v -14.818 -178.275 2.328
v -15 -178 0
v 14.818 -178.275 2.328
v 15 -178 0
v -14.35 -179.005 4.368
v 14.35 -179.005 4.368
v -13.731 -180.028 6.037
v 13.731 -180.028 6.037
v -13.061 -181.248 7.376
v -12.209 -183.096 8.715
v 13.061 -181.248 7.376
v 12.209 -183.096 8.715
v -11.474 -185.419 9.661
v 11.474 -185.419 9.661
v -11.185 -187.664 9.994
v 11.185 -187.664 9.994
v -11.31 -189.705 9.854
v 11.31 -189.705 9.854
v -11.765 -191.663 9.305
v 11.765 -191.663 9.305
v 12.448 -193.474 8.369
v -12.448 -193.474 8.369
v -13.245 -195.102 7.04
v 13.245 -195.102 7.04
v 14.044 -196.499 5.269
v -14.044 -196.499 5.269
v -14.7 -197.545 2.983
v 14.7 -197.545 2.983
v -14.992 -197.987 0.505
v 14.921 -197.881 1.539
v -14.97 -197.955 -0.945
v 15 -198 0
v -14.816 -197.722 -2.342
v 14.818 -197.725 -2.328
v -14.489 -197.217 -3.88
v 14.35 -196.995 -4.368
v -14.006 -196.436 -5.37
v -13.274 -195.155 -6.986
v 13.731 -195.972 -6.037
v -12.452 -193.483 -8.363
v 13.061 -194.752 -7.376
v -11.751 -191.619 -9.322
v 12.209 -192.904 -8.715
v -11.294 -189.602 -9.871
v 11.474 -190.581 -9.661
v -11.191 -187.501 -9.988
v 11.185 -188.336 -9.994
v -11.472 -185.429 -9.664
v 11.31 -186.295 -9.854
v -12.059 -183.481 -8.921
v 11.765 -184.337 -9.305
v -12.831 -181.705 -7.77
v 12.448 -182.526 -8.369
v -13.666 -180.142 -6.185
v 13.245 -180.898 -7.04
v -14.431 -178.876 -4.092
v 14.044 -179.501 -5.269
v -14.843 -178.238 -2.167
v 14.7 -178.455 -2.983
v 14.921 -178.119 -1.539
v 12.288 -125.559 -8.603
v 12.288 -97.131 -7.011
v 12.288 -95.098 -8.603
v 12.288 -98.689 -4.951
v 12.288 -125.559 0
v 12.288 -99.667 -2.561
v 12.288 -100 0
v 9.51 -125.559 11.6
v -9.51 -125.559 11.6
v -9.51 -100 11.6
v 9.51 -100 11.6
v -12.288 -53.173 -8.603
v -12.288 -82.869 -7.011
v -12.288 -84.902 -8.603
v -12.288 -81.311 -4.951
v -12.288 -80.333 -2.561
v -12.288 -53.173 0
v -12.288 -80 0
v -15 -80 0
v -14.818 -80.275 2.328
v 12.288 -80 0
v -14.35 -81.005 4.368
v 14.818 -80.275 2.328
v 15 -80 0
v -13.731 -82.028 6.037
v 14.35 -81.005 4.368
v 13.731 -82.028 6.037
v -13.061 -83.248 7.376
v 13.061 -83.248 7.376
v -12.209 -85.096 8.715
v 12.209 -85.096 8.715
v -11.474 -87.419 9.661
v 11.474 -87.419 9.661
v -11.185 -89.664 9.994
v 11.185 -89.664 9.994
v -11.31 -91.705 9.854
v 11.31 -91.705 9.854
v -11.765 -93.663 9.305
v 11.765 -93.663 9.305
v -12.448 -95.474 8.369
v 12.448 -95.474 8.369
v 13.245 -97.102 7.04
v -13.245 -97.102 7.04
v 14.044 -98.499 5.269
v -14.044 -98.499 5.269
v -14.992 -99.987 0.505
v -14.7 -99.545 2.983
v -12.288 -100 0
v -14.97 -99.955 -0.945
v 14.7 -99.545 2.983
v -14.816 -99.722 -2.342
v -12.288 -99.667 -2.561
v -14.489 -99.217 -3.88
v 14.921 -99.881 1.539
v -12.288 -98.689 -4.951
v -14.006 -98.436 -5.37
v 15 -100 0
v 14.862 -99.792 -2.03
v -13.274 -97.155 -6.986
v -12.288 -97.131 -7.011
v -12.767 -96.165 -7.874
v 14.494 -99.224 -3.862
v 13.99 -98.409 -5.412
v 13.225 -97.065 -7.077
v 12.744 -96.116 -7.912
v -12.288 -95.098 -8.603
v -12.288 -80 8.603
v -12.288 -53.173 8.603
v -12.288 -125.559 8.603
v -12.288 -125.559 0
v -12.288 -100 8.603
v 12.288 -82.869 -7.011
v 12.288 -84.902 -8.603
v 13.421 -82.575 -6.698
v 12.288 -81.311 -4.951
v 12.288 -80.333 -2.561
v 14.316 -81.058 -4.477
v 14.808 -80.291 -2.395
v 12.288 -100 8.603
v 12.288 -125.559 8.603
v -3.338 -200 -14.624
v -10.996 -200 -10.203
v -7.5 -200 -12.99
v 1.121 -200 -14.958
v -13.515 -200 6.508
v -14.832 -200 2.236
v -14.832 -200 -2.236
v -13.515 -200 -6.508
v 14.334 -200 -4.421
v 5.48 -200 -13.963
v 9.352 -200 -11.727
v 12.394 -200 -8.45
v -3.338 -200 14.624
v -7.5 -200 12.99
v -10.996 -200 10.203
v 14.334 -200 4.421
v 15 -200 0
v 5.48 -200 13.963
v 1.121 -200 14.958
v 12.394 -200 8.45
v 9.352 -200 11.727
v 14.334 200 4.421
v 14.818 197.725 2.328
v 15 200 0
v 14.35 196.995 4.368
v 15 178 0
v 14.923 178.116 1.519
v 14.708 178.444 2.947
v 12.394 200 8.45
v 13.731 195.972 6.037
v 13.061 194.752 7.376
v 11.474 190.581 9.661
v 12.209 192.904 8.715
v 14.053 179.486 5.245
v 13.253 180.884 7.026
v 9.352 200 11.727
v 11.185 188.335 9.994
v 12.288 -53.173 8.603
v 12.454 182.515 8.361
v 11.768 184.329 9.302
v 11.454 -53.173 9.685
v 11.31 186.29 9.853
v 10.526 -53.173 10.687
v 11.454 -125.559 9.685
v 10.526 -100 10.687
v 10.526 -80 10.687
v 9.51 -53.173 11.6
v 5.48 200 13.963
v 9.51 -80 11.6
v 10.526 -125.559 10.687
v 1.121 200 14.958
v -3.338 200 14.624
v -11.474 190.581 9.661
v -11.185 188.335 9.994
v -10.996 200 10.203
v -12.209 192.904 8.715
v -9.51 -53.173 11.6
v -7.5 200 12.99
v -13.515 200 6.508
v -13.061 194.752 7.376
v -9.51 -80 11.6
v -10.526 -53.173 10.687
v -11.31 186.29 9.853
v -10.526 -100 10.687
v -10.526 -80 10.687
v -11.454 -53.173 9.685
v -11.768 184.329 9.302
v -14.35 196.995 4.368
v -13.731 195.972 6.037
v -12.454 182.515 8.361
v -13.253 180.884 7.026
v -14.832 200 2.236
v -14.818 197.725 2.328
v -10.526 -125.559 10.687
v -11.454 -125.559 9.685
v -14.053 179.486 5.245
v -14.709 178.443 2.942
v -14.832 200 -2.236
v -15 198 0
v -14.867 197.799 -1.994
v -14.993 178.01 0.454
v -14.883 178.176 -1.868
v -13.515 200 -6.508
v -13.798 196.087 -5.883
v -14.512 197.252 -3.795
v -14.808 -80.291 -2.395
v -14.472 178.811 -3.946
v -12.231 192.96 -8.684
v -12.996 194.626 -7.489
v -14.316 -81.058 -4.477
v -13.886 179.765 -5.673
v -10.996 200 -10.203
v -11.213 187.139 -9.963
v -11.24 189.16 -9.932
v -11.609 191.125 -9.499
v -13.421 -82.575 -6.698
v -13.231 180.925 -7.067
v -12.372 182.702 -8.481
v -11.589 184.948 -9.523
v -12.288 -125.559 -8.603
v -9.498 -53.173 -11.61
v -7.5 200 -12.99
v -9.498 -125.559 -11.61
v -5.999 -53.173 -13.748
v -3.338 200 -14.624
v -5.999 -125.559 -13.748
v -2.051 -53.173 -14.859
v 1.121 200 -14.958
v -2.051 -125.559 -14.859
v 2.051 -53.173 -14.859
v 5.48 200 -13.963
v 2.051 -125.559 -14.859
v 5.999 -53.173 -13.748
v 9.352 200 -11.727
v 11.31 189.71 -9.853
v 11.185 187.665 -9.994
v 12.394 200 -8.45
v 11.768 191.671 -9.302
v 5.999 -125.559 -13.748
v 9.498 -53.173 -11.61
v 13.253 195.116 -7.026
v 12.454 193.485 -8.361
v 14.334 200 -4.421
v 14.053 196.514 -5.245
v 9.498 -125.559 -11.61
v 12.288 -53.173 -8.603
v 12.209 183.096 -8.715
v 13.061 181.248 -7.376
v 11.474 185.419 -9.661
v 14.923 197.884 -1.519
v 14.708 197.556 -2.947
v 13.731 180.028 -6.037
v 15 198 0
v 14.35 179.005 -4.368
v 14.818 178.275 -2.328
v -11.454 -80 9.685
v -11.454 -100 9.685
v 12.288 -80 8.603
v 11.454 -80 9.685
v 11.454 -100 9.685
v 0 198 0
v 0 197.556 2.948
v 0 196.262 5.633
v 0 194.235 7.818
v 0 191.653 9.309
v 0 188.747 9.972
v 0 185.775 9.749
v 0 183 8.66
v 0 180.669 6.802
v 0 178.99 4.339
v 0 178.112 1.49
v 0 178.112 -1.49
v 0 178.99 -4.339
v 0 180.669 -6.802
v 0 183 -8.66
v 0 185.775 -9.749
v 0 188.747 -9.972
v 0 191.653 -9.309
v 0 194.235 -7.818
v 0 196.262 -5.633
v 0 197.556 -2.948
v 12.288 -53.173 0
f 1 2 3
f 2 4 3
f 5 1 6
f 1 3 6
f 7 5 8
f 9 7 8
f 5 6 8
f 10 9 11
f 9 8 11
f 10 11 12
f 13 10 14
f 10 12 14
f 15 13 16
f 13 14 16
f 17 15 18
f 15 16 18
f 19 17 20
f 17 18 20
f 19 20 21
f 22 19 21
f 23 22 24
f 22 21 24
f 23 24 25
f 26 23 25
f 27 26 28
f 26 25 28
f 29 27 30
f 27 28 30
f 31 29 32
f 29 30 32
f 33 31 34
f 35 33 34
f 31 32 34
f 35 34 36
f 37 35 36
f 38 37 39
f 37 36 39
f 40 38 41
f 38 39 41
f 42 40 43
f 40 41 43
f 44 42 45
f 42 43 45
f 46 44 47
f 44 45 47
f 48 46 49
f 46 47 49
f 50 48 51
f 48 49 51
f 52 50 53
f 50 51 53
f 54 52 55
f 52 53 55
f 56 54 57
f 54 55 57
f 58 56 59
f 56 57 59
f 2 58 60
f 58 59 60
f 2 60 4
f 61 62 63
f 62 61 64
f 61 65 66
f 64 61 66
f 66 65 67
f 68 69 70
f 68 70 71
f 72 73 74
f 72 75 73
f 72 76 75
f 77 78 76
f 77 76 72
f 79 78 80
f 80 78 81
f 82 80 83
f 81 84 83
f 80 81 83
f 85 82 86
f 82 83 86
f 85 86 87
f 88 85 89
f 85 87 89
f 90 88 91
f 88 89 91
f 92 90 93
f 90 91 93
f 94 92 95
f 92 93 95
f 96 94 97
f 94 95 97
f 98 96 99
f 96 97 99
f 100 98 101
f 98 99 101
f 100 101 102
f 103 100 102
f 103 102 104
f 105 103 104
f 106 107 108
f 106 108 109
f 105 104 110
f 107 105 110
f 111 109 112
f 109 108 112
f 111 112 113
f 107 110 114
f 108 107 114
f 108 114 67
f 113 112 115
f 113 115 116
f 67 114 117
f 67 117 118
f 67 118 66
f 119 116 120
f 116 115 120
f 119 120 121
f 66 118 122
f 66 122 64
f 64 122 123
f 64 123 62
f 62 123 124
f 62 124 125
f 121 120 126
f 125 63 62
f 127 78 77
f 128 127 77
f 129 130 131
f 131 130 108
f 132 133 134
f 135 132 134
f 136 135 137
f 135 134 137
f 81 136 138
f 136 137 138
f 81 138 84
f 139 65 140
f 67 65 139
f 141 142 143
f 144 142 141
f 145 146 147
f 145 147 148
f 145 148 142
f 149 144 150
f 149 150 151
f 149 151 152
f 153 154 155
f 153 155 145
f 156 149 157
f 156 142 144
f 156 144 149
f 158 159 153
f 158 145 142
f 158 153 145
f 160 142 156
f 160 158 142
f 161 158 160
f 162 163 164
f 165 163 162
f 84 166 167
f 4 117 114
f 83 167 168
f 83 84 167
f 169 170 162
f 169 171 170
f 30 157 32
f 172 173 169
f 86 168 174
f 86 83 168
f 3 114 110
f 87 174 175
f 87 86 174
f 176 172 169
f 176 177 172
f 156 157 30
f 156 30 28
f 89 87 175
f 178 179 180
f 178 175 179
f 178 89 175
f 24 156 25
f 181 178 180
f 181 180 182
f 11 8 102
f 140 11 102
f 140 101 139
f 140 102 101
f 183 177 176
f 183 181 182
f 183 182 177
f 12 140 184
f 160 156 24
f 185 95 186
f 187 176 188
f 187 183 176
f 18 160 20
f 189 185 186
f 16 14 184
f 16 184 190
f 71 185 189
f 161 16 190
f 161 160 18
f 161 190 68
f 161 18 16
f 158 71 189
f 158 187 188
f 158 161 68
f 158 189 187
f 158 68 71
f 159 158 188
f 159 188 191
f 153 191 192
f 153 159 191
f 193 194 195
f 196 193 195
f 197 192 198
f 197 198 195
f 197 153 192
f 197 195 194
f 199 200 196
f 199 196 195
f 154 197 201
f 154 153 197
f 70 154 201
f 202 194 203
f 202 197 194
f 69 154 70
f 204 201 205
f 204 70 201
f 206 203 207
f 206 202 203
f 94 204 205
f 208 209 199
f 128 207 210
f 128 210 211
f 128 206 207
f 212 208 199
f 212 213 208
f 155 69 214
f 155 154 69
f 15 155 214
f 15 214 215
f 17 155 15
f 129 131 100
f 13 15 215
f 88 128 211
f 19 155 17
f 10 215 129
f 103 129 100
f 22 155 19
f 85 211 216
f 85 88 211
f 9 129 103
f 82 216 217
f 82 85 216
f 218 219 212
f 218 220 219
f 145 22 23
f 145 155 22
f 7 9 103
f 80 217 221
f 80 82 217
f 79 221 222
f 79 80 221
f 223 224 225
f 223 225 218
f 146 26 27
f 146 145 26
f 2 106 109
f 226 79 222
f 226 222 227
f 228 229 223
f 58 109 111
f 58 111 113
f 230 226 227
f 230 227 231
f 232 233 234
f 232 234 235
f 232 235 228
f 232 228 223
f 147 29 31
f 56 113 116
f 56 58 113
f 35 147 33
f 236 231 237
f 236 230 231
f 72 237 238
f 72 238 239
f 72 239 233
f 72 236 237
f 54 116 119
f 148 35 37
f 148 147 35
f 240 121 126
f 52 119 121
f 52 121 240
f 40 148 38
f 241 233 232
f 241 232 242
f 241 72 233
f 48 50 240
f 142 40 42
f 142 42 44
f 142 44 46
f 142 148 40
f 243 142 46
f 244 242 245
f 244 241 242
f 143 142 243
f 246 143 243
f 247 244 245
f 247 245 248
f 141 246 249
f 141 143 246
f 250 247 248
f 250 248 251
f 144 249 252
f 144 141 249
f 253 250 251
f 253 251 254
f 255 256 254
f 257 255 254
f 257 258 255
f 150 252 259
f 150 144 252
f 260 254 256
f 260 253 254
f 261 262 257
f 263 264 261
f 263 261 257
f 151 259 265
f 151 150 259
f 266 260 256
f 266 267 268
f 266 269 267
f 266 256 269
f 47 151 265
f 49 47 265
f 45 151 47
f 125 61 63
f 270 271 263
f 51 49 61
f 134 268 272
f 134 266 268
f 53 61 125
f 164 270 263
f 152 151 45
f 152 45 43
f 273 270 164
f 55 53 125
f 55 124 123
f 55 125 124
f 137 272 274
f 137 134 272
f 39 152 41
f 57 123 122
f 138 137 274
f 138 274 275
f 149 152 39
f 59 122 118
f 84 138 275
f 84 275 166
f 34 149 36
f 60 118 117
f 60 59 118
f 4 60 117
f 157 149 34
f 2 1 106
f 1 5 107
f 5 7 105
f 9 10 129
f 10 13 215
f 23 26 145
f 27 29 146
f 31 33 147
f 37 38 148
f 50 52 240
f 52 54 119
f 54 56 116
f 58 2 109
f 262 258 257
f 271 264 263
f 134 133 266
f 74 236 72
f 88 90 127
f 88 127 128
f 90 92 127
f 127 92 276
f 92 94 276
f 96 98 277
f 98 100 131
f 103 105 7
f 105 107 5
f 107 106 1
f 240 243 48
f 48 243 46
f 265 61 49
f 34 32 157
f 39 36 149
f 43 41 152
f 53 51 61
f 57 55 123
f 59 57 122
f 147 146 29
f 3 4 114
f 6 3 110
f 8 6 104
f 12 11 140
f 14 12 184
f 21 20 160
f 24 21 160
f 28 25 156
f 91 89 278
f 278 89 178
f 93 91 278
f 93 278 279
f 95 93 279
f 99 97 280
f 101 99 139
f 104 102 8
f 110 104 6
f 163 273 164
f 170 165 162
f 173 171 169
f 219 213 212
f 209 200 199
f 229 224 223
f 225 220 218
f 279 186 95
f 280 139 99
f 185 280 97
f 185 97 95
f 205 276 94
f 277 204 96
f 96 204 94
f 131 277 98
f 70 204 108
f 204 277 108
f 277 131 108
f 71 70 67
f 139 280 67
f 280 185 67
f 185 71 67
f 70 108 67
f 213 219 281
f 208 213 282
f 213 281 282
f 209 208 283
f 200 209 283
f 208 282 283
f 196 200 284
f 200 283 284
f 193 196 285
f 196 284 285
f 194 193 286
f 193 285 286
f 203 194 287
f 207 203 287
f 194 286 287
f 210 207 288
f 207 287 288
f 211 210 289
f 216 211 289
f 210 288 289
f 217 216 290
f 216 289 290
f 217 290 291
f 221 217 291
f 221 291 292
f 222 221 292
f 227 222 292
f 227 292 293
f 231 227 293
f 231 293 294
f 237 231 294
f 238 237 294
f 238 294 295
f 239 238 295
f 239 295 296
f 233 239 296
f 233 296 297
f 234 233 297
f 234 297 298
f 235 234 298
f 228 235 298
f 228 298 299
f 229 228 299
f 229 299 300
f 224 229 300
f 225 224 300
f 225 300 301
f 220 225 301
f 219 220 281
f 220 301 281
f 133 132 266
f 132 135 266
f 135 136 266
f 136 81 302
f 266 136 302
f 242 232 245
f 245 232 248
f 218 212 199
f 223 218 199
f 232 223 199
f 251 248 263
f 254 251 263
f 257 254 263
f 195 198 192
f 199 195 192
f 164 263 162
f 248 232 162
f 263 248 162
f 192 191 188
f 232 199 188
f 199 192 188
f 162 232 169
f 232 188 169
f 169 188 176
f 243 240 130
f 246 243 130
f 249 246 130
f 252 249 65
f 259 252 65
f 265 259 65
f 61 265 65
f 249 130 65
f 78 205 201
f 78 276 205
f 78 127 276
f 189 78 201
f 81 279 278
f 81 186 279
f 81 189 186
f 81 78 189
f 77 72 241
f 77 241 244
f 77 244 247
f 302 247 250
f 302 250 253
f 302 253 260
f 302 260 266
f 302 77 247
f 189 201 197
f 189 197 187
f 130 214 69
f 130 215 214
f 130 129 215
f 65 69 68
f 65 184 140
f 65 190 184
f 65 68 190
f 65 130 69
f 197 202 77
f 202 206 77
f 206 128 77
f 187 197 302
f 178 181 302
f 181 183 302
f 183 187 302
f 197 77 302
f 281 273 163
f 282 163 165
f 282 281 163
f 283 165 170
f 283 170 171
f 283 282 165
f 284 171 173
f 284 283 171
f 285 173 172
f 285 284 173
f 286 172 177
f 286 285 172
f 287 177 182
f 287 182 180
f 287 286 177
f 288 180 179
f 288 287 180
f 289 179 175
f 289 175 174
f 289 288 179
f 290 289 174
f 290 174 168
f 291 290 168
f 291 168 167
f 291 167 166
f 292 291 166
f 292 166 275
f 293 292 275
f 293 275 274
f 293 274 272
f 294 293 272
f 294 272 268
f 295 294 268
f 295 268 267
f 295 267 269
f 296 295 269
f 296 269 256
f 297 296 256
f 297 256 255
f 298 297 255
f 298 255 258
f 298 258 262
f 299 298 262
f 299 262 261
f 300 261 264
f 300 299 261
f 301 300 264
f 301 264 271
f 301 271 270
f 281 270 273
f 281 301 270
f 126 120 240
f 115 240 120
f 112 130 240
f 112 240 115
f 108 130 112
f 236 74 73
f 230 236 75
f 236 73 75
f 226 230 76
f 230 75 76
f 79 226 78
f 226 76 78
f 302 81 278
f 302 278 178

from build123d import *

# Parameters (mm, degrees)
F0_R     = 15
F1_DEPTH = 200
F2_R     = 10
F3_DEPTH = 200
F4_R     = 10
F5_DEPTH = 200
F6_W     = 24.5755761862
F6_H     = 72.3862349987
F7_DEPTH = 58.4
F8_DEPTH = 11.6


with BuildPart() as f1:
    # F0 (on Front) → F1 (new body, symmetric)
    with BuildSketch(Plane.XZ):
        Circle(F0_R)
    extrude(amount=F1_DEPTH, both=True)

    # F2 (on Right) → F3 (cut, symmetric)
    with BuildSketch(Plane.YZ):
        with Locations((188, 0)):
            Circle(F2_R)
        with Locations((-188, 0)):
            Circle(F2_R)
    extrude(amount=F3_DEPTH, both=True, mode=Mode.SUBTRACT)

    # F4 (on Right) → F5 (cut, symmetric)
    with BuildSketch(Plane.YZ):
        with Locations((-90, 0)):
            Circle(F4_R)
    extrude(amount=F5_DEPTH, both=True, mode=Mode.SUBTRACT)

    # F6 (on Top) → F7 (cut)
    with BuildSketch(Plane.XY):
        with Locations((0, -89.3657207489)):
            Rectangle(F6_W, F6_H)
    extrude(amount=-F7_DEPTH, mode=Mode.SUBTRACT)

    # F8 (cut): faces of the model
    f8_faces = [f1.faces().sort_by_distance(p)[0] for p in [
        (0, -66.5863016248, 0),
        (0, -112.7794191241, 0),
    ]]
    extrude(f8_faces, amount=-F8_DEPTH, mode=Mode.SUBTRACT)


solid = f1.part
